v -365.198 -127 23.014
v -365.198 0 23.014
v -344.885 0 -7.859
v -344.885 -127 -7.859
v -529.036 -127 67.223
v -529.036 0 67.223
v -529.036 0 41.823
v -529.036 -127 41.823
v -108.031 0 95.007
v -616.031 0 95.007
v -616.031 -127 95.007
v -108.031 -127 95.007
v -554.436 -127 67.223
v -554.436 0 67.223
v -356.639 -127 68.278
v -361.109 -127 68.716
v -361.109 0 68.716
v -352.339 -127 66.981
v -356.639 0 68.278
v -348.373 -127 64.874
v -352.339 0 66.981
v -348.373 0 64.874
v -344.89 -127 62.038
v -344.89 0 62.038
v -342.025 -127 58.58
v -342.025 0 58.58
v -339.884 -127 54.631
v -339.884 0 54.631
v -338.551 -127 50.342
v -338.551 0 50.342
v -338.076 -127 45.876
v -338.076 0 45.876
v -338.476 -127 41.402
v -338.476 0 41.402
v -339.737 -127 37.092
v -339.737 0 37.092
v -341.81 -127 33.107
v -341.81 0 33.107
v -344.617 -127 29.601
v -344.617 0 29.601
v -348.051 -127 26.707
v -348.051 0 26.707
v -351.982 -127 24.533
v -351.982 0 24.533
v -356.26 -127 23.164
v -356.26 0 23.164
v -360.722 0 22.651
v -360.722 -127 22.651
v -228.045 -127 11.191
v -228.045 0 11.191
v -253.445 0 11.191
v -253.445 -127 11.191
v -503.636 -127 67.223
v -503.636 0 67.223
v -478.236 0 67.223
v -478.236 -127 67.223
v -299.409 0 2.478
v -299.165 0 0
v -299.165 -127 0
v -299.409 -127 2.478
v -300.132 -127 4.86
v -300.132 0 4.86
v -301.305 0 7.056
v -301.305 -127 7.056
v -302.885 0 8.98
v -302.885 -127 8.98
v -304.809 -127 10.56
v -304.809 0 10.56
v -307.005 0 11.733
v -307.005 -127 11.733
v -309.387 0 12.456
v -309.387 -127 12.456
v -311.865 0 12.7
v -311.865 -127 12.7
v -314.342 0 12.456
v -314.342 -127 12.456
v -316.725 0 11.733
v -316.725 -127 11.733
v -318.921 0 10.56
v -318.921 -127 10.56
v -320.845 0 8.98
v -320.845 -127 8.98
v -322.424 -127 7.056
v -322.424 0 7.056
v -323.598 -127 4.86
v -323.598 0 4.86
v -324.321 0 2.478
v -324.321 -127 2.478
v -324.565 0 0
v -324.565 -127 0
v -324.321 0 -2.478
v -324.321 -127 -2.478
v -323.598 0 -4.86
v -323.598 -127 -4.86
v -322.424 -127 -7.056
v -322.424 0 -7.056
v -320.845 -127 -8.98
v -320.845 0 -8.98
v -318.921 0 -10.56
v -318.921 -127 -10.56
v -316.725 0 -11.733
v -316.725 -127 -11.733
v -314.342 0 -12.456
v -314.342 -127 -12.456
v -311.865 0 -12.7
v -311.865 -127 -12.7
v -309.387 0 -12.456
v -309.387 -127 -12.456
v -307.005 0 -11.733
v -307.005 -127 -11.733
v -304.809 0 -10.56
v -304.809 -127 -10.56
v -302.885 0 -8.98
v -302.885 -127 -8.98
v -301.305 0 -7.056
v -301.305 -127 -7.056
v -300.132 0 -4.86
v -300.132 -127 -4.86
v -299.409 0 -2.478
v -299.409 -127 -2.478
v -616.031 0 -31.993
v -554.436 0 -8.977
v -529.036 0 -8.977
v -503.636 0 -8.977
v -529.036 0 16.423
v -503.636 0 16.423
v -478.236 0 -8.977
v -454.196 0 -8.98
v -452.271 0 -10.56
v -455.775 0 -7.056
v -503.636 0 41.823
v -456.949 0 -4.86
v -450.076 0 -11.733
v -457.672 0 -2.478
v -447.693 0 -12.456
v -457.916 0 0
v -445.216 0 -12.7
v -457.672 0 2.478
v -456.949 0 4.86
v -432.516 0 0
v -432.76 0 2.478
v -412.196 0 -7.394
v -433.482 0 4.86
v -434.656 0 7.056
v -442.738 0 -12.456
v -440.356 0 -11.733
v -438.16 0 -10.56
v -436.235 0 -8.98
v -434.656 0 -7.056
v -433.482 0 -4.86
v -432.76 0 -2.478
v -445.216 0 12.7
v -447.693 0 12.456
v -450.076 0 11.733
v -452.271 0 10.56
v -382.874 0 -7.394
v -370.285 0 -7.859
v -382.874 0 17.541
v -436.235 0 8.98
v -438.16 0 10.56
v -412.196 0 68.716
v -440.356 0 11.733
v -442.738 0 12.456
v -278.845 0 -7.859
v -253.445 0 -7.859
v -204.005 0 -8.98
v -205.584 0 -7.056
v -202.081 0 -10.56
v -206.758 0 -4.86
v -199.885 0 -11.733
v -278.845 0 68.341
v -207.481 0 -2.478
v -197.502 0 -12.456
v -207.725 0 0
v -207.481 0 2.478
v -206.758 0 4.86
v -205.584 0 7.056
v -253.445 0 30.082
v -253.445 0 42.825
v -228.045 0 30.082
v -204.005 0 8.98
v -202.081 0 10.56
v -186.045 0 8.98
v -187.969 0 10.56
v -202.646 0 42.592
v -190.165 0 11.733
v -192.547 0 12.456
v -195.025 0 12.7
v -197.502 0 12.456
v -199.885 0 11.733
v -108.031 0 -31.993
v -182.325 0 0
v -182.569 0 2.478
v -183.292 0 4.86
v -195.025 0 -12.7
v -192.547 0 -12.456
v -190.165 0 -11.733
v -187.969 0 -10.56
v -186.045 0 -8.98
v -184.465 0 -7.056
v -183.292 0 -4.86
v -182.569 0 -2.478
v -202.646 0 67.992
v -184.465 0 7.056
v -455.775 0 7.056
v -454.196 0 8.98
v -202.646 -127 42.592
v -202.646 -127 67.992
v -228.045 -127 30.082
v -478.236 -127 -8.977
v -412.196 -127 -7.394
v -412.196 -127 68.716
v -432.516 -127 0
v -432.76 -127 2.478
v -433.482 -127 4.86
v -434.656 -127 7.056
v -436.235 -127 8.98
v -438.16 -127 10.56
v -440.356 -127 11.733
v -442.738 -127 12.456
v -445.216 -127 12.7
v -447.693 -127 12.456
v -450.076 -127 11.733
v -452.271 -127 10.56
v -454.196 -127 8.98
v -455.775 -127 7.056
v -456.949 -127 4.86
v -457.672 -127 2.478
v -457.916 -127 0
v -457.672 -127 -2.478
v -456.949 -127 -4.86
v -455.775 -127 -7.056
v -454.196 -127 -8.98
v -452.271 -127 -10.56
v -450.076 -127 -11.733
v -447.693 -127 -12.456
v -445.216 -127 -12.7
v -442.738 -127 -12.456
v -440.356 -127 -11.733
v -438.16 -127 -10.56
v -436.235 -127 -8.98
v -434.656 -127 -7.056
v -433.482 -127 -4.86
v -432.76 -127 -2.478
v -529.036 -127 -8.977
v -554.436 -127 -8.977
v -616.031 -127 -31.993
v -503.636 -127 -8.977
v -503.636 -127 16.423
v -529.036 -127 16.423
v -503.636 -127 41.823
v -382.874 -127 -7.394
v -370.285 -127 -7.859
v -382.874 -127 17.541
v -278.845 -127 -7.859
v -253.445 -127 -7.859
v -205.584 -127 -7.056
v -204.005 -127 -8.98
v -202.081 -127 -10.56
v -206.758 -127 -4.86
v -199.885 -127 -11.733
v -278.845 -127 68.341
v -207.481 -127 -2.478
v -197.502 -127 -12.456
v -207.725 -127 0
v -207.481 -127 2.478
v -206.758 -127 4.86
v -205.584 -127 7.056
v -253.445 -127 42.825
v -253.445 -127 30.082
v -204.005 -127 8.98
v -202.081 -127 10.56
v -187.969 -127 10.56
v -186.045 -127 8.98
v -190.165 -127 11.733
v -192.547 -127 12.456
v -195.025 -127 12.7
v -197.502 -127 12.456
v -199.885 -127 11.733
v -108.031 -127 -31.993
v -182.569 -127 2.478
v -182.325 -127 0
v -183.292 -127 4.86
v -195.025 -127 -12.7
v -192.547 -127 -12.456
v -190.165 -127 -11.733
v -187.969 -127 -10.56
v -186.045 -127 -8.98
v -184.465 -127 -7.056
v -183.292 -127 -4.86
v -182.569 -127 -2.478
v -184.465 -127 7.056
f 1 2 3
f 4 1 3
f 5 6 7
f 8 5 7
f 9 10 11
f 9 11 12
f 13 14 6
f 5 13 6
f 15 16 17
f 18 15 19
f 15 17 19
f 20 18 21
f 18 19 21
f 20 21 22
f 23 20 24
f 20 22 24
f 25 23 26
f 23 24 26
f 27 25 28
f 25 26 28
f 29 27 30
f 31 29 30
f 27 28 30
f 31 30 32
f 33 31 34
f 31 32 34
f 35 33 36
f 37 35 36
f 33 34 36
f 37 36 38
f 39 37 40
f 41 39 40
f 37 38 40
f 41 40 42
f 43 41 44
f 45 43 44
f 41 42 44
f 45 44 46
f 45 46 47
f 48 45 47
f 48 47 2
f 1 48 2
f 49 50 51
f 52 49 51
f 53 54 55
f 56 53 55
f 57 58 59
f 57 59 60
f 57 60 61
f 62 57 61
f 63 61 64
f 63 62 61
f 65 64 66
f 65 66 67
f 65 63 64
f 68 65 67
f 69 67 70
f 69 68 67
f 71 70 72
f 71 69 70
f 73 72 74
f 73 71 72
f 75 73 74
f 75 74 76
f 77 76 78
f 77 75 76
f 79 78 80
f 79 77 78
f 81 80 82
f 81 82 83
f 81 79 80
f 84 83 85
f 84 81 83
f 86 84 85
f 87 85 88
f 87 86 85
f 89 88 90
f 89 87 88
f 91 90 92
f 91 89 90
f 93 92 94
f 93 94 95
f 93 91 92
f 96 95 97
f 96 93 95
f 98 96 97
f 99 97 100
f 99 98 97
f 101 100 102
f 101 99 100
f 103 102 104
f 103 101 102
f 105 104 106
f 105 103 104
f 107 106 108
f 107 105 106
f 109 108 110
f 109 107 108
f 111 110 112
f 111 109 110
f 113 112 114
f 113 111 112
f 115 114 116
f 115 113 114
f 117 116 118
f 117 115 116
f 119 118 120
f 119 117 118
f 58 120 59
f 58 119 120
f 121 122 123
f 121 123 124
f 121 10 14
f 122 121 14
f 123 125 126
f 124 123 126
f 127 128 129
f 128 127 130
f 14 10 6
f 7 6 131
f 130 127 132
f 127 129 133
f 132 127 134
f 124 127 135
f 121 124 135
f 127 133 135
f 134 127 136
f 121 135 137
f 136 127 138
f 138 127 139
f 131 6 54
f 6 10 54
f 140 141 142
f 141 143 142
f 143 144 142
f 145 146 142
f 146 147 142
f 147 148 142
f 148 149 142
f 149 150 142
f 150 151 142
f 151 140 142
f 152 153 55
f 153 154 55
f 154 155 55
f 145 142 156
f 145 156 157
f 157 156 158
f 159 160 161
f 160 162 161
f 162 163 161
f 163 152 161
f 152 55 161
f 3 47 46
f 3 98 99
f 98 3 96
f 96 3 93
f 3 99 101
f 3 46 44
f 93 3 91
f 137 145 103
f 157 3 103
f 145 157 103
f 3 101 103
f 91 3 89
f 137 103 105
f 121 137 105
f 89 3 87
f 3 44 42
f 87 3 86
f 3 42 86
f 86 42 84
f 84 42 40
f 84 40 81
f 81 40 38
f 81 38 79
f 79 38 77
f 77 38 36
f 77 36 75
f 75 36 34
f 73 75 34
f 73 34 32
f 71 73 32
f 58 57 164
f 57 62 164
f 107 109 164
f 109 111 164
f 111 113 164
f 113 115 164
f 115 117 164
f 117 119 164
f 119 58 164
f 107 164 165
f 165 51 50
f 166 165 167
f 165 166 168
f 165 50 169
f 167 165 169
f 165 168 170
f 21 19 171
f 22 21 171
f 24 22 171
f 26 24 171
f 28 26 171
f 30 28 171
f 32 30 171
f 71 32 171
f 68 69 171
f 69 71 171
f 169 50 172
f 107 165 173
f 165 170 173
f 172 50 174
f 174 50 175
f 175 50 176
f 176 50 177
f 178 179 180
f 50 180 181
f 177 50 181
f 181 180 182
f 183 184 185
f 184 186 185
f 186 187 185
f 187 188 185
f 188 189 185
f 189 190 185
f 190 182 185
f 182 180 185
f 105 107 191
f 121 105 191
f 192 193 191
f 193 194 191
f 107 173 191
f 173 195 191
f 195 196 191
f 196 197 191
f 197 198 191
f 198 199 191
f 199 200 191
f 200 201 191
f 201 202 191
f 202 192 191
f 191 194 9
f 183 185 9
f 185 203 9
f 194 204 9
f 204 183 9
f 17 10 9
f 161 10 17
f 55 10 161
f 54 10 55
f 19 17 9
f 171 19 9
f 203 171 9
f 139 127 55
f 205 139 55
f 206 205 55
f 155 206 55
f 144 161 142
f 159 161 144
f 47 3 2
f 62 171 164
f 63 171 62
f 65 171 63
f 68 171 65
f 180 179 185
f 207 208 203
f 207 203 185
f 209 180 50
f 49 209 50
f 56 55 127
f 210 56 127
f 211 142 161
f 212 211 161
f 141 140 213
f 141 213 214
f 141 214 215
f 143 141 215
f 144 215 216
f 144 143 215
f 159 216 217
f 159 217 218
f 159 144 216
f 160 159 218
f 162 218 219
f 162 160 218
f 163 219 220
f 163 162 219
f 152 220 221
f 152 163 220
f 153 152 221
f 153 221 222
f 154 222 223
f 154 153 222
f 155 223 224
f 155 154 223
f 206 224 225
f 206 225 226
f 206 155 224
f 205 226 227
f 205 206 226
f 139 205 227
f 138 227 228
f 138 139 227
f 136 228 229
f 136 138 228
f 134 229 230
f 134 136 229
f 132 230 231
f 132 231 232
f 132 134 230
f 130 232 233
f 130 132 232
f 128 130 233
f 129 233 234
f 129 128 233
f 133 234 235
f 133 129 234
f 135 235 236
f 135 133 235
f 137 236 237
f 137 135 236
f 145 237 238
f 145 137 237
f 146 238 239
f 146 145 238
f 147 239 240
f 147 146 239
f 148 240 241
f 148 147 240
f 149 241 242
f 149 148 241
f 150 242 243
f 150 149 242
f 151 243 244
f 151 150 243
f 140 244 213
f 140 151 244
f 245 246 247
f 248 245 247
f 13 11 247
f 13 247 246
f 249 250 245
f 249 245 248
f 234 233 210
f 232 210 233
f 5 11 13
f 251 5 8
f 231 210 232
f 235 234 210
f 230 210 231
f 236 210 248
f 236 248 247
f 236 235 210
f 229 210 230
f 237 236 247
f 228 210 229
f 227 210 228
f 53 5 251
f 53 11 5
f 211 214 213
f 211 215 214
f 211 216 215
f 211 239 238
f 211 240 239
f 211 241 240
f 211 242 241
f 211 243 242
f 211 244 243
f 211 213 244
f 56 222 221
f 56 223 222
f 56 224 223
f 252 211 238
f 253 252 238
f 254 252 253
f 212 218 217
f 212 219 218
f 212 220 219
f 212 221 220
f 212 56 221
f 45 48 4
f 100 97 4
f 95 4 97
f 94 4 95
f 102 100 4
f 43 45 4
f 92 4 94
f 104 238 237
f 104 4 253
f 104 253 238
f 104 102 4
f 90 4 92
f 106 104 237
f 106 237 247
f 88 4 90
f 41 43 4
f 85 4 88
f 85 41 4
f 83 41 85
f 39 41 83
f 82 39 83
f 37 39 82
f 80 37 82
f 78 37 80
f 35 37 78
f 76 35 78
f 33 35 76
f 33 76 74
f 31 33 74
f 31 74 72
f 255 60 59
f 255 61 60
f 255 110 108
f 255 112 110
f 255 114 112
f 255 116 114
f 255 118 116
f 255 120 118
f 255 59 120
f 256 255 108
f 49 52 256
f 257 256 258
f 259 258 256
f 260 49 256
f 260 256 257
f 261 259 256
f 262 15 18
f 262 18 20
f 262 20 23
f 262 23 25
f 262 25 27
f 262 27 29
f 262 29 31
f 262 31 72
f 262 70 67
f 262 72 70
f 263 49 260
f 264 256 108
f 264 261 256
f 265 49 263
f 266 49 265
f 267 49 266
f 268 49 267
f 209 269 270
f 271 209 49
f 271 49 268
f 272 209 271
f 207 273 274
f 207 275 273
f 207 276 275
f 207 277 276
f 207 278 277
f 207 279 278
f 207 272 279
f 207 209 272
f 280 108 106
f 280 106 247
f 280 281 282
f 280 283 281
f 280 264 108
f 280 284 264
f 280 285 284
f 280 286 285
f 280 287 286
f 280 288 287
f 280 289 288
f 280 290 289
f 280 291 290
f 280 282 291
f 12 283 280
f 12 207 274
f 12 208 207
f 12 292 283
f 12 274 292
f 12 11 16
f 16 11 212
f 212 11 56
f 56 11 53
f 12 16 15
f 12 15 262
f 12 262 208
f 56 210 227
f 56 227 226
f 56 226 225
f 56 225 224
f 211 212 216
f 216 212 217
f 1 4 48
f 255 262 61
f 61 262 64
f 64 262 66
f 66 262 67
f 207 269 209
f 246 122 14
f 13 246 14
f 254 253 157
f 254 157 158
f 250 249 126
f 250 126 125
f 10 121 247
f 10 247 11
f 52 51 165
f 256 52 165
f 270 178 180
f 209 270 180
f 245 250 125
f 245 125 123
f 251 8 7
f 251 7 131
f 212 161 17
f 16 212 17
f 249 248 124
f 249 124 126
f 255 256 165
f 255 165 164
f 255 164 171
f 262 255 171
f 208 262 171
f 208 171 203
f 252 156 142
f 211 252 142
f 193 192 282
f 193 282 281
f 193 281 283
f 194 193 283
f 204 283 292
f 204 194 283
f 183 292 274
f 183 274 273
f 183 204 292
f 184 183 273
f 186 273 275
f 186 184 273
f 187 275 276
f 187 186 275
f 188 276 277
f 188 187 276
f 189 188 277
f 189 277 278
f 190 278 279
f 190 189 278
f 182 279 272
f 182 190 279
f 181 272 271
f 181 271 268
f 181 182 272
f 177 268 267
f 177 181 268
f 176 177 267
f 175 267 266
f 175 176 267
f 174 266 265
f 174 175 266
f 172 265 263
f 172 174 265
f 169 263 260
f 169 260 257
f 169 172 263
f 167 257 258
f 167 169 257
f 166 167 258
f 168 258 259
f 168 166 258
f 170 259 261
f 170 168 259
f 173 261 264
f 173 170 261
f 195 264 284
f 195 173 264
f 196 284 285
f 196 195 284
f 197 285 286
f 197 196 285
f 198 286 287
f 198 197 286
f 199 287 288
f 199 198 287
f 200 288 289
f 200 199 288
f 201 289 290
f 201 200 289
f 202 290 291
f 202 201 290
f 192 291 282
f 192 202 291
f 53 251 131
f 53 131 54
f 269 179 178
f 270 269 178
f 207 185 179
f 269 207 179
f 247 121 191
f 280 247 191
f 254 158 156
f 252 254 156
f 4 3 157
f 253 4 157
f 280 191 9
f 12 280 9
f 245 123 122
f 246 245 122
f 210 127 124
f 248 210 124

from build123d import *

# Parameters (mm, degrees)
F0_W     = 508
F0_H     = 127
F0_R     = 12.7
F1_DEPTH = 127


with BuildPart() as f1:
    # F0 (on Front) → F1 (new body)
    with BuildSketch(Plane.XZ):
        with Locations((-362.030605, 31.507092)):
            Rectangle(F0_W, F0_H)
        Polygon((-554.435605, 67.223251), (-529.035605, 67.223251), (-529.035605, 41.823251), (-503.635605, 41.823251), (-503.635605, 67.223251), (-478.235605, 67.223251), (-478.235605, -8.976749), (-503.635605, -8.976749), (-503.635605, 16.423251), (-529.035605, 16.423251), (-529.035605, -8.976749), (-554.435605, -8.976749), align=None, mode=Mode.SUBTRACT)
        with Locations((-445.215605, 0)):
            Circle(F0_R, mode=Mode.SUBTRACT)
        with BuildLine():
            Line((-412.195605, -7.393757), (-412.195605, 68.716164))
            Line((-412.195605, 68.716164), (-361.10922, 68.716164))
            ThreePointArc((-361.10922, 68.716164), (-338.166668, 43.629273), (-365.198272, 23.01362))
            Line((-365.198272, 23.01362), (-344.88481, -7.859427))
            Line((-344.88481, -7.859427), (-370.28481, -7.859427))
            Line((-370.28481, -7.859427), (-382.873771, 17.540573))
            Line((-382.873771, 17.540573), (-382.873771, -7.393757))
            Line((-382.873771, -7.393757), (-412.195605, -7.393757))
        make_face(mode=Mode.SUBTRACT)
        with Locations((-311.86481, 0)):
            Circle(F0_R, mode=Mode.SUBTRACT)
        Polygon((-253.44481, -7.859427), (-278.84481, -7.859427), (-278.84481, 68.340573), (-202.645605, 67.992452), (-202.645605, 42.592452), (-253.445075, 42.824533), (-253.445075, 30.082439), (-228.04481, 30.082439), (-228.04481, 11.190573), (-253.44481, 11.190573), align=None, mode=Mode.SUBTRACT)
        with Locations((-195.02481, 0)):
            Circle(F0_R, mode=Mode.SUBTRACT)
    extrude(amount=F1_DEPTH)


solid = f1.part
